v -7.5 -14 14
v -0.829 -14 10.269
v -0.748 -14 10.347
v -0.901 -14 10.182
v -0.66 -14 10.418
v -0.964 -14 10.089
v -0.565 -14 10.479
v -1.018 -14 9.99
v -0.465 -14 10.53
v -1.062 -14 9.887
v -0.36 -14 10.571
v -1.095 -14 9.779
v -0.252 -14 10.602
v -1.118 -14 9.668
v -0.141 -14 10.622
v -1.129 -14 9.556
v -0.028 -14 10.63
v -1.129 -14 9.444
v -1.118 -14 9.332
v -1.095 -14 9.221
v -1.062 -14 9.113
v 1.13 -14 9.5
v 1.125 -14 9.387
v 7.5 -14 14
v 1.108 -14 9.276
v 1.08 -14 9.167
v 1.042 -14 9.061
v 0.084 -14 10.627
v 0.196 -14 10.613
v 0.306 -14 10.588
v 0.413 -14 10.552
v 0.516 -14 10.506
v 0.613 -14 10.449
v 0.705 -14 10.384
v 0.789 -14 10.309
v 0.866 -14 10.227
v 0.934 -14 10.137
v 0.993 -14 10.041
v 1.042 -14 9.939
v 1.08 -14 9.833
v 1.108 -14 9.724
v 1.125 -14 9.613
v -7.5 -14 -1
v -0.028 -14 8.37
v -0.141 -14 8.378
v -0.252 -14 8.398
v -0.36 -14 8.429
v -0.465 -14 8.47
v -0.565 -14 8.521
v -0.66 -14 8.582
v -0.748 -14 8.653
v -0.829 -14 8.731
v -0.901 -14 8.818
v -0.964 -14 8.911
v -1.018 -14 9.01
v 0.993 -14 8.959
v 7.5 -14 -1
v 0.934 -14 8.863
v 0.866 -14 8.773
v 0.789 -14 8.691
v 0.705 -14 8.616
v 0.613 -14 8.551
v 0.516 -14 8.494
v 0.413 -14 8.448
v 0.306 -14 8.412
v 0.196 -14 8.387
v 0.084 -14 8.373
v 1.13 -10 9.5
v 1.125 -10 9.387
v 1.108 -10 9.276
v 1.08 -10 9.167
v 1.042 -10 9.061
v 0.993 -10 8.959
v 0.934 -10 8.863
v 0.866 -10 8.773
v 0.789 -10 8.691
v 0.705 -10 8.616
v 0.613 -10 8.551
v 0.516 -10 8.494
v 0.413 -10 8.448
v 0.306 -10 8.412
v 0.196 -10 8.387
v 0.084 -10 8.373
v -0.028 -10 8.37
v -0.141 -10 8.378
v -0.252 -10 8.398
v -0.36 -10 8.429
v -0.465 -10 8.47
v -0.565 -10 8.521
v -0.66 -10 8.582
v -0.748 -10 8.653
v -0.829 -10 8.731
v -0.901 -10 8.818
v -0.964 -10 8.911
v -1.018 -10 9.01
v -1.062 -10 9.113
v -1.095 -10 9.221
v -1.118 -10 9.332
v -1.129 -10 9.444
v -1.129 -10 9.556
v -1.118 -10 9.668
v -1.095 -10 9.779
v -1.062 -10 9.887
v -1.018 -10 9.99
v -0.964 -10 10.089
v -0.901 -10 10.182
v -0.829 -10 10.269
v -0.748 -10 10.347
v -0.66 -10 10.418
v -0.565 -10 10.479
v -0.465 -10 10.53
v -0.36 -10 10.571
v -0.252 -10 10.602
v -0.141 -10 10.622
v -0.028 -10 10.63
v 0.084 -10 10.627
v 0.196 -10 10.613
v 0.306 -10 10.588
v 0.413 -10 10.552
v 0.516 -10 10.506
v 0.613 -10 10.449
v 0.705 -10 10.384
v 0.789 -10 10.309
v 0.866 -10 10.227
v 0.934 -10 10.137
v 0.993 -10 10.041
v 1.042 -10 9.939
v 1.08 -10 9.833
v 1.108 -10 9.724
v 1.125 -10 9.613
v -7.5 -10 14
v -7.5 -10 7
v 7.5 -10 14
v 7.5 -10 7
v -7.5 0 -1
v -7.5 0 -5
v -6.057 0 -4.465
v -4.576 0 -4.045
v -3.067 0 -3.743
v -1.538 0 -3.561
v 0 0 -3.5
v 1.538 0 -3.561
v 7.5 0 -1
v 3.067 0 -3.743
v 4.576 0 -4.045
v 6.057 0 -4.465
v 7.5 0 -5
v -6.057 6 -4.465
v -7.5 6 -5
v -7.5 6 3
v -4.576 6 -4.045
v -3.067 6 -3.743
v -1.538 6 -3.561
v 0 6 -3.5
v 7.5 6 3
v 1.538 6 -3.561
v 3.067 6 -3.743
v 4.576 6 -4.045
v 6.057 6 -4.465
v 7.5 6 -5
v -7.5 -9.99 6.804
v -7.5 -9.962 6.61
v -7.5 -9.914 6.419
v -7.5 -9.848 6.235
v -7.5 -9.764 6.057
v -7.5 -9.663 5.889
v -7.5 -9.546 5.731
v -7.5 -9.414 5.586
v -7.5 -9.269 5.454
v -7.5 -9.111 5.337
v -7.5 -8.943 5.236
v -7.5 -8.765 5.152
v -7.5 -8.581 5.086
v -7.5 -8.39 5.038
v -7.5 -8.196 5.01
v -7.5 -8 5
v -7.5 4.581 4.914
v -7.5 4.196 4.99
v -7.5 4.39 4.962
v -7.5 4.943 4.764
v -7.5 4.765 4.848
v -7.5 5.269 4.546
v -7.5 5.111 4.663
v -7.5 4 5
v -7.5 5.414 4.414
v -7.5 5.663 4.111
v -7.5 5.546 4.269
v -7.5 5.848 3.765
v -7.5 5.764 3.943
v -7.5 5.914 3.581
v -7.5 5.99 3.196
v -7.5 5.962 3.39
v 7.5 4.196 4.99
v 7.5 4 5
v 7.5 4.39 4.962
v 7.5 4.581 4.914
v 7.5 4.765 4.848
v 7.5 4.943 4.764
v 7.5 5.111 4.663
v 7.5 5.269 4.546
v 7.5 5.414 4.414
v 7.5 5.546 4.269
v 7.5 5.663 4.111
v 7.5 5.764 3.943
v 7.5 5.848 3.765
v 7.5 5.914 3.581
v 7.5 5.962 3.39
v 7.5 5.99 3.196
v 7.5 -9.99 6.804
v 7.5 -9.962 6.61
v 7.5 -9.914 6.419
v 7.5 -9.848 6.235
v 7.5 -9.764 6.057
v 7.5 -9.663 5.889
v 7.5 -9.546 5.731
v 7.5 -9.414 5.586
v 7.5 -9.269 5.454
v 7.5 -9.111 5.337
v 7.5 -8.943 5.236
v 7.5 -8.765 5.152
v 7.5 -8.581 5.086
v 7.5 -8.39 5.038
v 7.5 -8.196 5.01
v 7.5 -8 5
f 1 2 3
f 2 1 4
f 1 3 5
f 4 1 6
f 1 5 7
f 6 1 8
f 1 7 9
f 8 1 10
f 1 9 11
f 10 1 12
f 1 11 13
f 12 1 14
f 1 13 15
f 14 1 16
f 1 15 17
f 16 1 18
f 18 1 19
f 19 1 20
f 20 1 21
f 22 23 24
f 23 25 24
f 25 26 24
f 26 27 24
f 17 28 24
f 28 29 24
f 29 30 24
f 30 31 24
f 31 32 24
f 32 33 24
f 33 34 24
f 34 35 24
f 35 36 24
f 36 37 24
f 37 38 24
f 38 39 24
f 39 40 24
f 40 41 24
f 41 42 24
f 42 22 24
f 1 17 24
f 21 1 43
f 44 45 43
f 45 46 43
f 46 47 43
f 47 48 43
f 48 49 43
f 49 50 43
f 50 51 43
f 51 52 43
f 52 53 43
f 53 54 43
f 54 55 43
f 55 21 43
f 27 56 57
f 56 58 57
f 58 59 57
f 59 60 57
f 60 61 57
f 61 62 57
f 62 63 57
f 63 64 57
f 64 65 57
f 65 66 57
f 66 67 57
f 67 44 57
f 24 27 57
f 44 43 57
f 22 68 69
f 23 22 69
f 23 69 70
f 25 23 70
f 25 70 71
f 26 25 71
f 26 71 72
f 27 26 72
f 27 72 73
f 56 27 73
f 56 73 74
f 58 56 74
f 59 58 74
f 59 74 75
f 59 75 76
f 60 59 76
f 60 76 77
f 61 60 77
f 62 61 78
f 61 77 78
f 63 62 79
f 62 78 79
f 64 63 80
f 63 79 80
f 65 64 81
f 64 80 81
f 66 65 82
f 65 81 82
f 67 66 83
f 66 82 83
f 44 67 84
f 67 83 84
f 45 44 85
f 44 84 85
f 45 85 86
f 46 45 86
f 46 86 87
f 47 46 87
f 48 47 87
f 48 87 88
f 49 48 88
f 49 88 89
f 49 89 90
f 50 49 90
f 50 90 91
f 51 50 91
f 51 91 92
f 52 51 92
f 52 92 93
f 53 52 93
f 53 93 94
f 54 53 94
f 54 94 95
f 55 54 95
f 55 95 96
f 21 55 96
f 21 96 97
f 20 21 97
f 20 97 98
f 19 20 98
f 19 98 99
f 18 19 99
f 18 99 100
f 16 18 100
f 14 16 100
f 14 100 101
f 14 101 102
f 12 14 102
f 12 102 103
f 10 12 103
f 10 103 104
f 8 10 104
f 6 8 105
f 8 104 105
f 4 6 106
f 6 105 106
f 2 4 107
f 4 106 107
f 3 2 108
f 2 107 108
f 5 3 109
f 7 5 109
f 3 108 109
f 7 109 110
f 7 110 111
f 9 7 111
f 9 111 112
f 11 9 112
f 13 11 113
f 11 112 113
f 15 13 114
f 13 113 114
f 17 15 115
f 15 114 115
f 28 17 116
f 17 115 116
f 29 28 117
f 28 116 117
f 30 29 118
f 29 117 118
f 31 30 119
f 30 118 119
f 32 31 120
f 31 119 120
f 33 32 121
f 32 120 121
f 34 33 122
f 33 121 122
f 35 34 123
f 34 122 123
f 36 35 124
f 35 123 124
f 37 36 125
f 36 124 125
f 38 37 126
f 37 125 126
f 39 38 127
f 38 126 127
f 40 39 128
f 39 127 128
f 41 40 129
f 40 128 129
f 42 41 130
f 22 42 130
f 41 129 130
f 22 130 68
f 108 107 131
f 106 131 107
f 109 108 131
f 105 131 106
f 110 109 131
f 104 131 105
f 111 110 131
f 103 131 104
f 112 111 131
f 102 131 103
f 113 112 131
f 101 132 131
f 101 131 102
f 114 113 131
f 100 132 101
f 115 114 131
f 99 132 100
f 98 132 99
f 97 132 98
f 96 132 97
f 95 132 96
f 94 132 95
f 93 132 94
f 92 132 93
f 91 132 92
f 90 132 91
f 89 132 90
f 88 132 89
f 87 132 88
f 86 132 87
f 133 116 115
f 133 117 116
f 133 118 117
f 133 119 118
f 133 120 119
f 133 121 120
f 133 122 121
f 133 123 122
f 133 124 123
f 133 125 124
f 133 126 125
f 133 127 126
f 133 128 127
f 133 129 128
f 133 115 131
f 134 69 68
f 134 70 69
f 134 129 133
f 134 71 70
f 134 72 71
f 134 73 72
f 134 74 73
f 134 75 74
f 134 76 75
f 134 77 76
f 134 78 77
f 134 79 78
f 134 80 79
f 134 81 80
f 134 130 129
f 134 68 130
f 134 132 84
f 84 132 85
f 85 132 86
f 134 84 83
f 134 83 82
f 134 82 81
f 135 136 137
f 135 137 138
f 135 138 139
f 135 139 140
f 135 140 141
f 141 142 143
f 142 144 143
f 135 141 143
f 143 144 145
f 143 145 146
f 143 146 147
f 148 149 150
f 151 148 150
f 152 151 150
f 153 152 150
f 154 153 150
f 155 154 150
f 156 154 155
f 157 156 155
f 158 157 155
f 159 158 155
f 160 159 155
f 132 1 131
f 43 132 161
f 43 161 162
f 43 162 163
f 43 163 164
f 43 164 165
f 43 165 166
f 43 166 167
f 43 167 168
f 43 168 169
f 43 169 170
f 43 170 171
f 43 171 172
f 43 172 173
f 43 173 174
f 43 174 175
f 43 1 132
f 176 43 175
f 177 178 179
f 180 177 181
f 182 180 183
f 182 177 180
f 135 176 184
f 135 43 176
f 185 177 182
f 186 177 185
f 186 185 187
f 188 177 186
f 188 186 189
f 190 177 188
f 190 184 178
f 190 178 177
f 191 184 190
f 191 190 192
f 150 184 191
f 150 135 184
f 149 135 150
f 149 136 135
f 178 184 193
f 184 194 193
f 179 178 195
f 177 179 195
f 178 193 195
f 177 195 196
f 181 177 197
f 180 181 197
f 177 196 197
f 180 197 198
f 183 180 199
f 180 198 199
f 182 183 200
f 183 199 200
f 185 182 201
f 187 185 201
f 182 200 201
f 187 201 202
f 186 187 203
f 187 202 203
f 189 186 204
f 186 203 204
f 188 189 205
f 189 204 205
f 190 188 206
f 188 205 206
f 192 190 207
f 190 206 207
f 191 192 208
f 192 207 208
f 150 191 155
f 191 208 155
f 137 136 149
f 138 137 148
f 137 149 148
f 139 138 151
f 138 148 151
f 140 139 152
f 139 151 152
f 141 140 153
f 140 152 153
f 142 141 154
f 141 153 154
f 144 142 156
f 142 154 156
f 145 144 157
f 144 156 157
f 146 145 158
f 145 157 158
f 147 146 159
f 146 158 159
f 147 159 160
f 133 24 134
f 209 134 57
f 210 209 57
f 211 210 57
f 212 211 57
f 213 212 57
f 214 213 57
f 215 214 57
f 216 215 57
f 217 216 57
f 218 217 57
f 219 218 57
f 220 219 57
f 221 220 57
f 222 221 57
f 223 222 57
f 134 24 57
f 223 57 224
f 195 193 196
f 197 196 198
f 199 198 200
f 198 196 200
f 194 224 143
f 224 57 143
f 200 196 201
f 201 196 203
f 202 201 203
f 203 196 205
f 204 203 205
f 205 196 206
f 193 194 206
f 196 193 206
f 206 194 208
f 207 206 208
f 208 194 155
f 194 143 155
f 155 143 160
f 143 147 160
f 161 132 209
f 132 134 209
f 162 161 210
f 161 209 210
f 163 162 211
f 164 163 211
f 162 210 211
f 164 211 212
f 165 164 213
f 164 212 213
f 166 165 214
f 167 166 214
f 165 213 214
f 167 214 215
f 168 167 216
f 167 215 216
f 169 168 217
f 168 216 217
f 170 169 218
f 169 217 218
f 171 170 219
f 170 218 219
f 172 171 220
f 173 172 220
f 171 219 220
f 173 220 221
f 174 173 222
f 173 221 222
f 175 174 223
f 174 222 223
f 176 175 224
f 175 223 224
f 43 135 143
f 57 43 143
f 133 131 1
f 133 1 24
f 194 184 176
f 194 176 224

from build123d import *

# Parameters (mm, degrees)
SKETCH1_W                 = 15
SKETCH1_H                 = 10
BOSS_EXTRUDE1_DEPTH       = 6
SKETCH2_R                 = 19.5
CUT_EXTRUDE1_DEPTH        = 9
SKETCH3_W                 = 15
SKETCH3_H                 = 6
BOSS_EXTRUDE2_DEPTH       = 20
SKETCH4_W                 = 15
SKETCH4_H                 = 4
BOSS_EXTRUDE3_DEPTH       = 9
F_4_40_TAPPED_HOLE2_D     = 2.2606
F_4_40_TAPPED_HOLE2_DEPTH = 7.6
F_4_40_TAPPED_HOLE2_TIP   = 0.679152758
FILLET2_R                 = 2


with BuildPart() as part:
    # Sketch1 → Boss-Extrude1 (new body)
    with BuildSketch(Plane(origin=(0, 0, 0), x_dir=(1, 0, 0), z_dir=(0, 1, 0))):
        Rectangle(SKETCH1_W, SKETCH1_H)
    extrude(amount=BOSS_EXTRUDE1_DEPTH)

    # Sketch2 → Cut-Extrude1 (cut)
    with BuildSketch(Plane(origin=(0, 6, 0), x_dir=(1, 0, 0), z_dir=(0, 1, 0))):
        with Locations((0, 23)):
            Circle(SKETCH2_R)
    extrude(amount=-CUT_EXTRUDE1_DEPTH, mode=Mode.SUBTRACT)

    # Sketch3 → Boss-Extrude2 (add)
    with BuildSketch(Plane(origin=(0, 6, 0), x_dir=(1, 0, 0), z_dir=(0, 1, 0))):
        with Locations((0, -2)):
            Rectangle(SKETCH3_W, SKETCH3_H)
    extrude(amount=-BOSS_EXTRUDE2_DEPTH)

    # Sketch4 → Boss-Extrude3 (add)
    with BuildSketch(Plane.XY.offset(5)):
        with Locations((0, -12)):
            Rectangle(SKETCH4_W, SKETCH4_H)
    extrude(amount=BOSS_EXTRUDE3_DEPTH)

    # #4-40 Tapped Hole2
    with Locations(Plane(origin=(0, -14, 0), x_dir=(-1, 0, 0), z_dir=(0, -1, 0))):
        with Locations((0, -9.5)):
            Hole(F_4_40_TAPPED_HOLE2_D / 2, depth=F_4_40_TAPPED_HOLE2_DEPTH)
            with Locations((0, 0, -(F_4_40_TAPPED_HOLE2_DEPTH + F_4_40_TAPPED_HOLE2_TIP / 2))):  # 118° drill point
                Cone(0, F_4_40_TAPPED_HOLE2_D / 2, F_4_40_TAPPED_HOLE2_TIP, mode=Mode.SUBTRACT)

    # Fillet2
    fillet2_edges = [part.edges().sort_by_distance(p)[0] for p in [
        (0, -10, 5),
        (0, 6, 5),
    ]]
    fillet(fillet2_edges, radius=FILLET2_R)


solid = part.part
